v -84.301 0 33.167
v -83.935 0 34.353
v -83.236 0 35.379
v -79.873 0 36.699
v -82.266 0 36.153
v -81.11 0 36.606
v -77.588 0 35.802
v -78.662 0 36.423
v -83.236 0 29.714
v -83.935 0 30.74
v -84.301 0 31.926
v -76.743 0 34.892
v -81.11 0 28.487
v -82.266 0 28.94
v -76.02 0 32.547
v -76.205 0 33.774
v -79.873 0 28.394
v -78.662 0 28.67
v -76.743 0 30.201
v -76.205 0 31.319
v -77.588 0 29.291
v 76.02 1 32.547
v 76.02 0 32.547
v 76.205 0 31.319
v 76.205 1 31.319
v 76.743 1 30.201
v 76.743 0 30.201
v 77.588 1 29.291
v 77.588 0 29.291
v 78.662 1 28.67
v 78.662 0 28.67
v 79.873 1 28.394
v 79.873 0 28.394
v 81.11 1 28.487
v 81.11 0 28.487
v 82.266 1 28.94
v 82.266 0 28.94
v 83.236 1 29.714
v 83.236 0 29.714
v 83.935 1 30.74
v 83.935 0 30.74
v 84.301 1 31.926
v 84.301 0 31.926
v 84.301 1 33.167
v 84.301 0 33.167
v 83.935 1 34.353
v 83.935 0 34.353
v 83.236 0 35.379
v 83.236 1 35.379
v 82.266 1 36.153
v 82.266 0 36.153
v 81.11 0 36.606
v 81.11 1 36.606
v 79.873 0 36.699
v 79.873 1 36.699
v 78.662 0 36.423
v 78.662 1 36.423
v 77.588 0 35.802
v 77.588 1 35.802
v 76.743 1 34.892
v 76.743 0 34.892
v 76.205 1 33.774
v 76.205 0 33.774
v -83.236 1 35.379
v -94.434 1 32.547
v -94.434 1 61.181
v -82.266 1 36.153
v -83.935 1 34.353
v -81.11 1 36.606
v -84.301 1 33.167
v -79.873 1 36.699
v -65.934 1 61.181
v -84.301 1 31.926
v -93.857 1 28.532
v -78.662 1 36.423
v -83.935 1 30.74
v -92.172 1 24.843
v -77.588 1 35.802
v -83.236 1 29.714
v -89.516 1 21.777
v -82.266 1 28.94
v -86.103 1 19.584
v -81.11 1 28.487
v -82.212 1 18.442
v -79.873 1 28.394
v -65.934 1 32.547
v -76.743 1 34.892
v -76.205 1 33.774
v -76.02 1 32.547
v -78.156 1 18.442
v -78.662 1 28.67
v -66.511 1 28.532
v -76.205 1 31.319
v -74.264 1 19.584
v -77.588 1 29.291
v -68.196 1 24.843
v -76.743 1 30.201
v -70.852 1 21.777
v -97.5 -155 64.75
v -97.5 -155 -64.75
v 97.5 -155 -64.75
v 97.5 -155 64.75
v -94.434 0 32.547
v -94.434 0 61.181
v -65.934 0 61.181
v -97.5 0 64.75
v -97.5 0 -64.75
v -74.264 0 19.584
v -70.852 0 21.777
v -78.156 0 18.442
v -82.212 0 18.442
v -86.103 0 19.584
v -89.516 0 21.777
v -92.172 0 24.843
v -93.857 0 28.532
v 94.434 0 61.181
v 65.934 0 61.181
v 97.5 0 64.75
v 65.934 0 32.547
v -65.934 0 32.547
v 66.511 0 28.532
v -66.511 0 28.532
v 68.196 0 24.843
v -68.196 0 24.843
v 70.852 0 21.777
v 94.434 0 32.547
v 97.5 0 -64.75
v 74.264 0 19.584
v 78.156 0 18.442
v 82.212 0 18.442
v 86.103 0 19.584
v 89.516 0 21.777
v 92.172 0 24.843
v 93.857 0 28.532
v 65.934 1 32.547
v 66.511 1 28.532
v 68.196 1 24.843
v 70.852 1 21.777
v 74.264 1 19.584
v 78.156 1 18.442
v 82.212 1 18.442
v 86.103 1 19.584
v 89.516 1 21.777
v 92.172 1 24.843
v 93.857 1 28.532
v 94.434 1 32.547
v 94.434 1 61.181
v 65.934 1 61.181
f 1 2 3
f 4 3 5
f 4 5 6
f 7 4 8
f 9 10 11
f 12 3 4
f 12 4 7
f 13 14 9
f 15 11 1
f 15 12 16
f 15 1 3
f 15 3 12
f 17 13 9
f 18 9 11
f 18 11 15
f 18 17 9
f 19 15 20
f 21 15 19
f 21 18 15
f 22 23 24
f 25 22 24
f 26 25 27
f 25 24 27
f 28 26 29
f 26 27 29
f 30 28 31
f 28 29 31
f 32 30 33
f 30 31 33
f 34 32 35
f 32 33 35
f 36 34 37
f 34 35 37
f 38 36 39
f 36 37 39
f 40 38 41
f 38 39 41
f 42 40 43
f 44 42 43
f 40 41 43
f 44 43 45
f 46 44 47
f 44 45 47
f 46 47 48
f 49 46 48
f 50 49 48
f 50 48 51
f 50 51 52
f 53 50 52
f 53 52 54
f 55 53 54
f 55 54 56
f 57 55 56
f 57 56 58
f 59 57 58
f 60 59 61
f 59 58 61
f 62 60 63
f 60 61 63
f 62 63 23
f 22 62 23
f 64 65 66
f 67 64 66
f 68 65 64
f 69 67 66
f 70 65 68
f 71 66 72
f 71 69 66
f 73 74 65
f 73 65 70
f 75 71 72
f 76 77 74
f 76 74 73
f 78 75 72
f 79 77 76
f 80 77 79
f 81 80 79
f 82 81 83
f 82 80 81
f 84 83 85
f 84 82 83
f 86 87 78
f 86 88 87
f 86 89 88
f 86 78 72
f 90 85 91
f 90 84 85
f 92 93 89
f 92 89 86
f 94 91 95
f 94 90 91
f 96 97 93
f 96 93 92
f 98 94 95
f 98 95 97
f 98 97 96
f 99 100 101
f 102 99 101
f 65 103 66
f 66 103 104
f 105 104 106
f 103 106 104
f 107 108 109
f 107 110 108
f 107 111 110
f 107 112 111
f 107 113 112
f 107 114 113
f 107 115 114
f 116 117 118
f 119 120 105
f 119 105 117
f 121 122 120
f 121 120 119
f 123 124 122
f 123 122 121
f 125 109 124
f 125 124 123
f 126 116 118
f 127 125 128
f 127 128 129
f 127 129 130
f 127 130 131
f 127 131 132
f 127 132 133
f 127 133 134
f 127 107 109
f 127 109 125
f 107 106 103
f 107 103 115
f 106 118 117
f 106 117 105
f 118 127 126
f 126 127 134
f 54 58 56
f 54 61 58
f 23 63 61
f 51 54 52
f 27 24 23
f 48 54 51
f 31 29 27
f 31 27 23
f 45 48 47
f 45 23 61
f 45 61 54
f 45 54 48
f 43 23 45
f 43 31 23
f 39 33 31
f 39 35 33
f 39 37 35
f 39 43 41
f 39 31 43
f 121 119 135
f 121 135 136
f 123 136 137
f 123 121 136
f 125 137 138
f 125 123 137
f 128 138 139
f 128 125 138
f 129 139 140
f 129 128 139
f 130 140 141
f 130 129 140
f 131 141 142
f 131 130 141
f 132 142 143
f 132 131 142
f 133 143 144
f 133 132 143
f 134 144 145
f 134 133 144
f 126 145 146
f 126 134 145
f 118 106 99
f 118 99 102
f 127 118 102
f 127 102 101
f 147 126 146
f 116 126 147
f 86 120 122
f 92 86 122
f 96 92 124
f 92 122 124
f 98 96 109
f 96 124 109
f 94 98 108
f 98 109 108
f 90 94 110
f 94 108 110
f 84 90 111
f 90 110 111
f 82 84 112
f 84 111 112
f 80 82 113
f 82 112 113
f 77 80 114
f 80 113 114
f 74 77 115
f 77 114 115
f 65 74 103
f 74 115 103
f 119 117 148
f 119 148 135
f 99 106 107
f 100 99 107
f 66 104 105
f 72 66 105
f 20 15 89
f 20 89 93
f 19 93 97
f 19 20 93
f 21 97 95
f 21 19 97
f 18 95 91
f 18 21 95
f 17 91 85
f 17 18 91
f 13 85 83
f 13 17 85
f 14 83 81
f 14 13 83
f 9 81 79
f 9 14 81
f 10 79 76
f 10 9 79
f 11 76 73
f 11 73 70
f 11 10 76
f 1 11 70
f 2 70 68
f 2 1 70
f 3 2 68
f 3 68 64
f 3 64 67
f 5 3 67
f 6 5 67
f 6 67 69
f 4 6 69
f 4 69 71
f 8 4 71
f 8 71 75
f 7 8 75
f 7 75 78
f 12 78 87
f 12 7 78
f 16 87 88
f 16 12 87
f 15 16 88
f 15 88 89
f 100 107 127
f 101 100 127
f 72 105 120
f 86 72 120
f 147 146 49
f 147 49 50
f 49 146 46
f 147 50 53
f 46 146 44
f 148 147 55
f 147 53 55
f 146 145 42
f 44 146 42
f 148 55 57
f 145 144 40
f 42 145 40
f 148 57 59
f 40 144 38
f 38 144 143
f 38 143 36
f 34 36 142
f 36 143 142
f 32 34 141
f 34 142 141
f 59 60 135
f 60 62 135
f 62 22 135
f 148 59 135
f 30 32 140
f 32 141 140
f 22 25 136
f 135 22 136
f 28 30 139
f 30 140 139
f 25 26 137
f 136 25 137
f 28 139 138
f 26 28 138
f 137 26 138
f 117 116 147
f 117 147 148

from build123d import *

# Parameters (mm, degrees)
SKETCH1_W           = 195
SKETCH1_H           = 129.5
BOSS_EXTRUDE1_DEPTH = 155
SKETCH2_R           = 4.164052638
BOSS_EXTRUDE2_DEPTH = 1


with BuildPart() as part:
    # Sketch1 → Boss-Extrude1 (new body)
    with BuildSketch(Plane(origin=(0, 0, 0), x_dir=(1, 0, 0), z_dir=(0, 1, 0))):
        Rectangle(SKETCH1_W, SKETCH1_H)
    extrude(amount=-BOSS_EXTRUDE1_DEPTH)

    # Sketch2 → Boss-Extrude2 (add)
    with BuildSketch(Plane(origin=(0, 0, 0), x_dir=(1, 0, 0), z_dir=(0, 1, 0))):
        with BuildLine():
            Line((-94.433753678, -61.181302267), (-65.933753678, -61.181302267))
            Line((-65.933753678, -61.181302267), (-65.933753678, -32.546661398))
            ThreePointArc((-65.933753678, -32.546661398), (-80.183753678, -18.296661398), (-94.433753678, -32.546661398))
            Line((-94.433753678, -32.546661398), (-94.433753678, -61.181302267))
        make_face()
        with Locations((-80.183753678, -32.546661398)):
            Circle(SKETCH2_R, mode=Mode.SUBTRACT)
    boss_extrude2 = extrude(amount=BOSS_EXTRUDE2_DEPTH)

    # Mirror1: Boss-Extrude2 across plane
    add(boss_extrude2.mirror(Plane(origin=(0, 0, 0), x_dir=(0, 0, 1), z_dir=(1, 0, 0))))


solid = part.part
